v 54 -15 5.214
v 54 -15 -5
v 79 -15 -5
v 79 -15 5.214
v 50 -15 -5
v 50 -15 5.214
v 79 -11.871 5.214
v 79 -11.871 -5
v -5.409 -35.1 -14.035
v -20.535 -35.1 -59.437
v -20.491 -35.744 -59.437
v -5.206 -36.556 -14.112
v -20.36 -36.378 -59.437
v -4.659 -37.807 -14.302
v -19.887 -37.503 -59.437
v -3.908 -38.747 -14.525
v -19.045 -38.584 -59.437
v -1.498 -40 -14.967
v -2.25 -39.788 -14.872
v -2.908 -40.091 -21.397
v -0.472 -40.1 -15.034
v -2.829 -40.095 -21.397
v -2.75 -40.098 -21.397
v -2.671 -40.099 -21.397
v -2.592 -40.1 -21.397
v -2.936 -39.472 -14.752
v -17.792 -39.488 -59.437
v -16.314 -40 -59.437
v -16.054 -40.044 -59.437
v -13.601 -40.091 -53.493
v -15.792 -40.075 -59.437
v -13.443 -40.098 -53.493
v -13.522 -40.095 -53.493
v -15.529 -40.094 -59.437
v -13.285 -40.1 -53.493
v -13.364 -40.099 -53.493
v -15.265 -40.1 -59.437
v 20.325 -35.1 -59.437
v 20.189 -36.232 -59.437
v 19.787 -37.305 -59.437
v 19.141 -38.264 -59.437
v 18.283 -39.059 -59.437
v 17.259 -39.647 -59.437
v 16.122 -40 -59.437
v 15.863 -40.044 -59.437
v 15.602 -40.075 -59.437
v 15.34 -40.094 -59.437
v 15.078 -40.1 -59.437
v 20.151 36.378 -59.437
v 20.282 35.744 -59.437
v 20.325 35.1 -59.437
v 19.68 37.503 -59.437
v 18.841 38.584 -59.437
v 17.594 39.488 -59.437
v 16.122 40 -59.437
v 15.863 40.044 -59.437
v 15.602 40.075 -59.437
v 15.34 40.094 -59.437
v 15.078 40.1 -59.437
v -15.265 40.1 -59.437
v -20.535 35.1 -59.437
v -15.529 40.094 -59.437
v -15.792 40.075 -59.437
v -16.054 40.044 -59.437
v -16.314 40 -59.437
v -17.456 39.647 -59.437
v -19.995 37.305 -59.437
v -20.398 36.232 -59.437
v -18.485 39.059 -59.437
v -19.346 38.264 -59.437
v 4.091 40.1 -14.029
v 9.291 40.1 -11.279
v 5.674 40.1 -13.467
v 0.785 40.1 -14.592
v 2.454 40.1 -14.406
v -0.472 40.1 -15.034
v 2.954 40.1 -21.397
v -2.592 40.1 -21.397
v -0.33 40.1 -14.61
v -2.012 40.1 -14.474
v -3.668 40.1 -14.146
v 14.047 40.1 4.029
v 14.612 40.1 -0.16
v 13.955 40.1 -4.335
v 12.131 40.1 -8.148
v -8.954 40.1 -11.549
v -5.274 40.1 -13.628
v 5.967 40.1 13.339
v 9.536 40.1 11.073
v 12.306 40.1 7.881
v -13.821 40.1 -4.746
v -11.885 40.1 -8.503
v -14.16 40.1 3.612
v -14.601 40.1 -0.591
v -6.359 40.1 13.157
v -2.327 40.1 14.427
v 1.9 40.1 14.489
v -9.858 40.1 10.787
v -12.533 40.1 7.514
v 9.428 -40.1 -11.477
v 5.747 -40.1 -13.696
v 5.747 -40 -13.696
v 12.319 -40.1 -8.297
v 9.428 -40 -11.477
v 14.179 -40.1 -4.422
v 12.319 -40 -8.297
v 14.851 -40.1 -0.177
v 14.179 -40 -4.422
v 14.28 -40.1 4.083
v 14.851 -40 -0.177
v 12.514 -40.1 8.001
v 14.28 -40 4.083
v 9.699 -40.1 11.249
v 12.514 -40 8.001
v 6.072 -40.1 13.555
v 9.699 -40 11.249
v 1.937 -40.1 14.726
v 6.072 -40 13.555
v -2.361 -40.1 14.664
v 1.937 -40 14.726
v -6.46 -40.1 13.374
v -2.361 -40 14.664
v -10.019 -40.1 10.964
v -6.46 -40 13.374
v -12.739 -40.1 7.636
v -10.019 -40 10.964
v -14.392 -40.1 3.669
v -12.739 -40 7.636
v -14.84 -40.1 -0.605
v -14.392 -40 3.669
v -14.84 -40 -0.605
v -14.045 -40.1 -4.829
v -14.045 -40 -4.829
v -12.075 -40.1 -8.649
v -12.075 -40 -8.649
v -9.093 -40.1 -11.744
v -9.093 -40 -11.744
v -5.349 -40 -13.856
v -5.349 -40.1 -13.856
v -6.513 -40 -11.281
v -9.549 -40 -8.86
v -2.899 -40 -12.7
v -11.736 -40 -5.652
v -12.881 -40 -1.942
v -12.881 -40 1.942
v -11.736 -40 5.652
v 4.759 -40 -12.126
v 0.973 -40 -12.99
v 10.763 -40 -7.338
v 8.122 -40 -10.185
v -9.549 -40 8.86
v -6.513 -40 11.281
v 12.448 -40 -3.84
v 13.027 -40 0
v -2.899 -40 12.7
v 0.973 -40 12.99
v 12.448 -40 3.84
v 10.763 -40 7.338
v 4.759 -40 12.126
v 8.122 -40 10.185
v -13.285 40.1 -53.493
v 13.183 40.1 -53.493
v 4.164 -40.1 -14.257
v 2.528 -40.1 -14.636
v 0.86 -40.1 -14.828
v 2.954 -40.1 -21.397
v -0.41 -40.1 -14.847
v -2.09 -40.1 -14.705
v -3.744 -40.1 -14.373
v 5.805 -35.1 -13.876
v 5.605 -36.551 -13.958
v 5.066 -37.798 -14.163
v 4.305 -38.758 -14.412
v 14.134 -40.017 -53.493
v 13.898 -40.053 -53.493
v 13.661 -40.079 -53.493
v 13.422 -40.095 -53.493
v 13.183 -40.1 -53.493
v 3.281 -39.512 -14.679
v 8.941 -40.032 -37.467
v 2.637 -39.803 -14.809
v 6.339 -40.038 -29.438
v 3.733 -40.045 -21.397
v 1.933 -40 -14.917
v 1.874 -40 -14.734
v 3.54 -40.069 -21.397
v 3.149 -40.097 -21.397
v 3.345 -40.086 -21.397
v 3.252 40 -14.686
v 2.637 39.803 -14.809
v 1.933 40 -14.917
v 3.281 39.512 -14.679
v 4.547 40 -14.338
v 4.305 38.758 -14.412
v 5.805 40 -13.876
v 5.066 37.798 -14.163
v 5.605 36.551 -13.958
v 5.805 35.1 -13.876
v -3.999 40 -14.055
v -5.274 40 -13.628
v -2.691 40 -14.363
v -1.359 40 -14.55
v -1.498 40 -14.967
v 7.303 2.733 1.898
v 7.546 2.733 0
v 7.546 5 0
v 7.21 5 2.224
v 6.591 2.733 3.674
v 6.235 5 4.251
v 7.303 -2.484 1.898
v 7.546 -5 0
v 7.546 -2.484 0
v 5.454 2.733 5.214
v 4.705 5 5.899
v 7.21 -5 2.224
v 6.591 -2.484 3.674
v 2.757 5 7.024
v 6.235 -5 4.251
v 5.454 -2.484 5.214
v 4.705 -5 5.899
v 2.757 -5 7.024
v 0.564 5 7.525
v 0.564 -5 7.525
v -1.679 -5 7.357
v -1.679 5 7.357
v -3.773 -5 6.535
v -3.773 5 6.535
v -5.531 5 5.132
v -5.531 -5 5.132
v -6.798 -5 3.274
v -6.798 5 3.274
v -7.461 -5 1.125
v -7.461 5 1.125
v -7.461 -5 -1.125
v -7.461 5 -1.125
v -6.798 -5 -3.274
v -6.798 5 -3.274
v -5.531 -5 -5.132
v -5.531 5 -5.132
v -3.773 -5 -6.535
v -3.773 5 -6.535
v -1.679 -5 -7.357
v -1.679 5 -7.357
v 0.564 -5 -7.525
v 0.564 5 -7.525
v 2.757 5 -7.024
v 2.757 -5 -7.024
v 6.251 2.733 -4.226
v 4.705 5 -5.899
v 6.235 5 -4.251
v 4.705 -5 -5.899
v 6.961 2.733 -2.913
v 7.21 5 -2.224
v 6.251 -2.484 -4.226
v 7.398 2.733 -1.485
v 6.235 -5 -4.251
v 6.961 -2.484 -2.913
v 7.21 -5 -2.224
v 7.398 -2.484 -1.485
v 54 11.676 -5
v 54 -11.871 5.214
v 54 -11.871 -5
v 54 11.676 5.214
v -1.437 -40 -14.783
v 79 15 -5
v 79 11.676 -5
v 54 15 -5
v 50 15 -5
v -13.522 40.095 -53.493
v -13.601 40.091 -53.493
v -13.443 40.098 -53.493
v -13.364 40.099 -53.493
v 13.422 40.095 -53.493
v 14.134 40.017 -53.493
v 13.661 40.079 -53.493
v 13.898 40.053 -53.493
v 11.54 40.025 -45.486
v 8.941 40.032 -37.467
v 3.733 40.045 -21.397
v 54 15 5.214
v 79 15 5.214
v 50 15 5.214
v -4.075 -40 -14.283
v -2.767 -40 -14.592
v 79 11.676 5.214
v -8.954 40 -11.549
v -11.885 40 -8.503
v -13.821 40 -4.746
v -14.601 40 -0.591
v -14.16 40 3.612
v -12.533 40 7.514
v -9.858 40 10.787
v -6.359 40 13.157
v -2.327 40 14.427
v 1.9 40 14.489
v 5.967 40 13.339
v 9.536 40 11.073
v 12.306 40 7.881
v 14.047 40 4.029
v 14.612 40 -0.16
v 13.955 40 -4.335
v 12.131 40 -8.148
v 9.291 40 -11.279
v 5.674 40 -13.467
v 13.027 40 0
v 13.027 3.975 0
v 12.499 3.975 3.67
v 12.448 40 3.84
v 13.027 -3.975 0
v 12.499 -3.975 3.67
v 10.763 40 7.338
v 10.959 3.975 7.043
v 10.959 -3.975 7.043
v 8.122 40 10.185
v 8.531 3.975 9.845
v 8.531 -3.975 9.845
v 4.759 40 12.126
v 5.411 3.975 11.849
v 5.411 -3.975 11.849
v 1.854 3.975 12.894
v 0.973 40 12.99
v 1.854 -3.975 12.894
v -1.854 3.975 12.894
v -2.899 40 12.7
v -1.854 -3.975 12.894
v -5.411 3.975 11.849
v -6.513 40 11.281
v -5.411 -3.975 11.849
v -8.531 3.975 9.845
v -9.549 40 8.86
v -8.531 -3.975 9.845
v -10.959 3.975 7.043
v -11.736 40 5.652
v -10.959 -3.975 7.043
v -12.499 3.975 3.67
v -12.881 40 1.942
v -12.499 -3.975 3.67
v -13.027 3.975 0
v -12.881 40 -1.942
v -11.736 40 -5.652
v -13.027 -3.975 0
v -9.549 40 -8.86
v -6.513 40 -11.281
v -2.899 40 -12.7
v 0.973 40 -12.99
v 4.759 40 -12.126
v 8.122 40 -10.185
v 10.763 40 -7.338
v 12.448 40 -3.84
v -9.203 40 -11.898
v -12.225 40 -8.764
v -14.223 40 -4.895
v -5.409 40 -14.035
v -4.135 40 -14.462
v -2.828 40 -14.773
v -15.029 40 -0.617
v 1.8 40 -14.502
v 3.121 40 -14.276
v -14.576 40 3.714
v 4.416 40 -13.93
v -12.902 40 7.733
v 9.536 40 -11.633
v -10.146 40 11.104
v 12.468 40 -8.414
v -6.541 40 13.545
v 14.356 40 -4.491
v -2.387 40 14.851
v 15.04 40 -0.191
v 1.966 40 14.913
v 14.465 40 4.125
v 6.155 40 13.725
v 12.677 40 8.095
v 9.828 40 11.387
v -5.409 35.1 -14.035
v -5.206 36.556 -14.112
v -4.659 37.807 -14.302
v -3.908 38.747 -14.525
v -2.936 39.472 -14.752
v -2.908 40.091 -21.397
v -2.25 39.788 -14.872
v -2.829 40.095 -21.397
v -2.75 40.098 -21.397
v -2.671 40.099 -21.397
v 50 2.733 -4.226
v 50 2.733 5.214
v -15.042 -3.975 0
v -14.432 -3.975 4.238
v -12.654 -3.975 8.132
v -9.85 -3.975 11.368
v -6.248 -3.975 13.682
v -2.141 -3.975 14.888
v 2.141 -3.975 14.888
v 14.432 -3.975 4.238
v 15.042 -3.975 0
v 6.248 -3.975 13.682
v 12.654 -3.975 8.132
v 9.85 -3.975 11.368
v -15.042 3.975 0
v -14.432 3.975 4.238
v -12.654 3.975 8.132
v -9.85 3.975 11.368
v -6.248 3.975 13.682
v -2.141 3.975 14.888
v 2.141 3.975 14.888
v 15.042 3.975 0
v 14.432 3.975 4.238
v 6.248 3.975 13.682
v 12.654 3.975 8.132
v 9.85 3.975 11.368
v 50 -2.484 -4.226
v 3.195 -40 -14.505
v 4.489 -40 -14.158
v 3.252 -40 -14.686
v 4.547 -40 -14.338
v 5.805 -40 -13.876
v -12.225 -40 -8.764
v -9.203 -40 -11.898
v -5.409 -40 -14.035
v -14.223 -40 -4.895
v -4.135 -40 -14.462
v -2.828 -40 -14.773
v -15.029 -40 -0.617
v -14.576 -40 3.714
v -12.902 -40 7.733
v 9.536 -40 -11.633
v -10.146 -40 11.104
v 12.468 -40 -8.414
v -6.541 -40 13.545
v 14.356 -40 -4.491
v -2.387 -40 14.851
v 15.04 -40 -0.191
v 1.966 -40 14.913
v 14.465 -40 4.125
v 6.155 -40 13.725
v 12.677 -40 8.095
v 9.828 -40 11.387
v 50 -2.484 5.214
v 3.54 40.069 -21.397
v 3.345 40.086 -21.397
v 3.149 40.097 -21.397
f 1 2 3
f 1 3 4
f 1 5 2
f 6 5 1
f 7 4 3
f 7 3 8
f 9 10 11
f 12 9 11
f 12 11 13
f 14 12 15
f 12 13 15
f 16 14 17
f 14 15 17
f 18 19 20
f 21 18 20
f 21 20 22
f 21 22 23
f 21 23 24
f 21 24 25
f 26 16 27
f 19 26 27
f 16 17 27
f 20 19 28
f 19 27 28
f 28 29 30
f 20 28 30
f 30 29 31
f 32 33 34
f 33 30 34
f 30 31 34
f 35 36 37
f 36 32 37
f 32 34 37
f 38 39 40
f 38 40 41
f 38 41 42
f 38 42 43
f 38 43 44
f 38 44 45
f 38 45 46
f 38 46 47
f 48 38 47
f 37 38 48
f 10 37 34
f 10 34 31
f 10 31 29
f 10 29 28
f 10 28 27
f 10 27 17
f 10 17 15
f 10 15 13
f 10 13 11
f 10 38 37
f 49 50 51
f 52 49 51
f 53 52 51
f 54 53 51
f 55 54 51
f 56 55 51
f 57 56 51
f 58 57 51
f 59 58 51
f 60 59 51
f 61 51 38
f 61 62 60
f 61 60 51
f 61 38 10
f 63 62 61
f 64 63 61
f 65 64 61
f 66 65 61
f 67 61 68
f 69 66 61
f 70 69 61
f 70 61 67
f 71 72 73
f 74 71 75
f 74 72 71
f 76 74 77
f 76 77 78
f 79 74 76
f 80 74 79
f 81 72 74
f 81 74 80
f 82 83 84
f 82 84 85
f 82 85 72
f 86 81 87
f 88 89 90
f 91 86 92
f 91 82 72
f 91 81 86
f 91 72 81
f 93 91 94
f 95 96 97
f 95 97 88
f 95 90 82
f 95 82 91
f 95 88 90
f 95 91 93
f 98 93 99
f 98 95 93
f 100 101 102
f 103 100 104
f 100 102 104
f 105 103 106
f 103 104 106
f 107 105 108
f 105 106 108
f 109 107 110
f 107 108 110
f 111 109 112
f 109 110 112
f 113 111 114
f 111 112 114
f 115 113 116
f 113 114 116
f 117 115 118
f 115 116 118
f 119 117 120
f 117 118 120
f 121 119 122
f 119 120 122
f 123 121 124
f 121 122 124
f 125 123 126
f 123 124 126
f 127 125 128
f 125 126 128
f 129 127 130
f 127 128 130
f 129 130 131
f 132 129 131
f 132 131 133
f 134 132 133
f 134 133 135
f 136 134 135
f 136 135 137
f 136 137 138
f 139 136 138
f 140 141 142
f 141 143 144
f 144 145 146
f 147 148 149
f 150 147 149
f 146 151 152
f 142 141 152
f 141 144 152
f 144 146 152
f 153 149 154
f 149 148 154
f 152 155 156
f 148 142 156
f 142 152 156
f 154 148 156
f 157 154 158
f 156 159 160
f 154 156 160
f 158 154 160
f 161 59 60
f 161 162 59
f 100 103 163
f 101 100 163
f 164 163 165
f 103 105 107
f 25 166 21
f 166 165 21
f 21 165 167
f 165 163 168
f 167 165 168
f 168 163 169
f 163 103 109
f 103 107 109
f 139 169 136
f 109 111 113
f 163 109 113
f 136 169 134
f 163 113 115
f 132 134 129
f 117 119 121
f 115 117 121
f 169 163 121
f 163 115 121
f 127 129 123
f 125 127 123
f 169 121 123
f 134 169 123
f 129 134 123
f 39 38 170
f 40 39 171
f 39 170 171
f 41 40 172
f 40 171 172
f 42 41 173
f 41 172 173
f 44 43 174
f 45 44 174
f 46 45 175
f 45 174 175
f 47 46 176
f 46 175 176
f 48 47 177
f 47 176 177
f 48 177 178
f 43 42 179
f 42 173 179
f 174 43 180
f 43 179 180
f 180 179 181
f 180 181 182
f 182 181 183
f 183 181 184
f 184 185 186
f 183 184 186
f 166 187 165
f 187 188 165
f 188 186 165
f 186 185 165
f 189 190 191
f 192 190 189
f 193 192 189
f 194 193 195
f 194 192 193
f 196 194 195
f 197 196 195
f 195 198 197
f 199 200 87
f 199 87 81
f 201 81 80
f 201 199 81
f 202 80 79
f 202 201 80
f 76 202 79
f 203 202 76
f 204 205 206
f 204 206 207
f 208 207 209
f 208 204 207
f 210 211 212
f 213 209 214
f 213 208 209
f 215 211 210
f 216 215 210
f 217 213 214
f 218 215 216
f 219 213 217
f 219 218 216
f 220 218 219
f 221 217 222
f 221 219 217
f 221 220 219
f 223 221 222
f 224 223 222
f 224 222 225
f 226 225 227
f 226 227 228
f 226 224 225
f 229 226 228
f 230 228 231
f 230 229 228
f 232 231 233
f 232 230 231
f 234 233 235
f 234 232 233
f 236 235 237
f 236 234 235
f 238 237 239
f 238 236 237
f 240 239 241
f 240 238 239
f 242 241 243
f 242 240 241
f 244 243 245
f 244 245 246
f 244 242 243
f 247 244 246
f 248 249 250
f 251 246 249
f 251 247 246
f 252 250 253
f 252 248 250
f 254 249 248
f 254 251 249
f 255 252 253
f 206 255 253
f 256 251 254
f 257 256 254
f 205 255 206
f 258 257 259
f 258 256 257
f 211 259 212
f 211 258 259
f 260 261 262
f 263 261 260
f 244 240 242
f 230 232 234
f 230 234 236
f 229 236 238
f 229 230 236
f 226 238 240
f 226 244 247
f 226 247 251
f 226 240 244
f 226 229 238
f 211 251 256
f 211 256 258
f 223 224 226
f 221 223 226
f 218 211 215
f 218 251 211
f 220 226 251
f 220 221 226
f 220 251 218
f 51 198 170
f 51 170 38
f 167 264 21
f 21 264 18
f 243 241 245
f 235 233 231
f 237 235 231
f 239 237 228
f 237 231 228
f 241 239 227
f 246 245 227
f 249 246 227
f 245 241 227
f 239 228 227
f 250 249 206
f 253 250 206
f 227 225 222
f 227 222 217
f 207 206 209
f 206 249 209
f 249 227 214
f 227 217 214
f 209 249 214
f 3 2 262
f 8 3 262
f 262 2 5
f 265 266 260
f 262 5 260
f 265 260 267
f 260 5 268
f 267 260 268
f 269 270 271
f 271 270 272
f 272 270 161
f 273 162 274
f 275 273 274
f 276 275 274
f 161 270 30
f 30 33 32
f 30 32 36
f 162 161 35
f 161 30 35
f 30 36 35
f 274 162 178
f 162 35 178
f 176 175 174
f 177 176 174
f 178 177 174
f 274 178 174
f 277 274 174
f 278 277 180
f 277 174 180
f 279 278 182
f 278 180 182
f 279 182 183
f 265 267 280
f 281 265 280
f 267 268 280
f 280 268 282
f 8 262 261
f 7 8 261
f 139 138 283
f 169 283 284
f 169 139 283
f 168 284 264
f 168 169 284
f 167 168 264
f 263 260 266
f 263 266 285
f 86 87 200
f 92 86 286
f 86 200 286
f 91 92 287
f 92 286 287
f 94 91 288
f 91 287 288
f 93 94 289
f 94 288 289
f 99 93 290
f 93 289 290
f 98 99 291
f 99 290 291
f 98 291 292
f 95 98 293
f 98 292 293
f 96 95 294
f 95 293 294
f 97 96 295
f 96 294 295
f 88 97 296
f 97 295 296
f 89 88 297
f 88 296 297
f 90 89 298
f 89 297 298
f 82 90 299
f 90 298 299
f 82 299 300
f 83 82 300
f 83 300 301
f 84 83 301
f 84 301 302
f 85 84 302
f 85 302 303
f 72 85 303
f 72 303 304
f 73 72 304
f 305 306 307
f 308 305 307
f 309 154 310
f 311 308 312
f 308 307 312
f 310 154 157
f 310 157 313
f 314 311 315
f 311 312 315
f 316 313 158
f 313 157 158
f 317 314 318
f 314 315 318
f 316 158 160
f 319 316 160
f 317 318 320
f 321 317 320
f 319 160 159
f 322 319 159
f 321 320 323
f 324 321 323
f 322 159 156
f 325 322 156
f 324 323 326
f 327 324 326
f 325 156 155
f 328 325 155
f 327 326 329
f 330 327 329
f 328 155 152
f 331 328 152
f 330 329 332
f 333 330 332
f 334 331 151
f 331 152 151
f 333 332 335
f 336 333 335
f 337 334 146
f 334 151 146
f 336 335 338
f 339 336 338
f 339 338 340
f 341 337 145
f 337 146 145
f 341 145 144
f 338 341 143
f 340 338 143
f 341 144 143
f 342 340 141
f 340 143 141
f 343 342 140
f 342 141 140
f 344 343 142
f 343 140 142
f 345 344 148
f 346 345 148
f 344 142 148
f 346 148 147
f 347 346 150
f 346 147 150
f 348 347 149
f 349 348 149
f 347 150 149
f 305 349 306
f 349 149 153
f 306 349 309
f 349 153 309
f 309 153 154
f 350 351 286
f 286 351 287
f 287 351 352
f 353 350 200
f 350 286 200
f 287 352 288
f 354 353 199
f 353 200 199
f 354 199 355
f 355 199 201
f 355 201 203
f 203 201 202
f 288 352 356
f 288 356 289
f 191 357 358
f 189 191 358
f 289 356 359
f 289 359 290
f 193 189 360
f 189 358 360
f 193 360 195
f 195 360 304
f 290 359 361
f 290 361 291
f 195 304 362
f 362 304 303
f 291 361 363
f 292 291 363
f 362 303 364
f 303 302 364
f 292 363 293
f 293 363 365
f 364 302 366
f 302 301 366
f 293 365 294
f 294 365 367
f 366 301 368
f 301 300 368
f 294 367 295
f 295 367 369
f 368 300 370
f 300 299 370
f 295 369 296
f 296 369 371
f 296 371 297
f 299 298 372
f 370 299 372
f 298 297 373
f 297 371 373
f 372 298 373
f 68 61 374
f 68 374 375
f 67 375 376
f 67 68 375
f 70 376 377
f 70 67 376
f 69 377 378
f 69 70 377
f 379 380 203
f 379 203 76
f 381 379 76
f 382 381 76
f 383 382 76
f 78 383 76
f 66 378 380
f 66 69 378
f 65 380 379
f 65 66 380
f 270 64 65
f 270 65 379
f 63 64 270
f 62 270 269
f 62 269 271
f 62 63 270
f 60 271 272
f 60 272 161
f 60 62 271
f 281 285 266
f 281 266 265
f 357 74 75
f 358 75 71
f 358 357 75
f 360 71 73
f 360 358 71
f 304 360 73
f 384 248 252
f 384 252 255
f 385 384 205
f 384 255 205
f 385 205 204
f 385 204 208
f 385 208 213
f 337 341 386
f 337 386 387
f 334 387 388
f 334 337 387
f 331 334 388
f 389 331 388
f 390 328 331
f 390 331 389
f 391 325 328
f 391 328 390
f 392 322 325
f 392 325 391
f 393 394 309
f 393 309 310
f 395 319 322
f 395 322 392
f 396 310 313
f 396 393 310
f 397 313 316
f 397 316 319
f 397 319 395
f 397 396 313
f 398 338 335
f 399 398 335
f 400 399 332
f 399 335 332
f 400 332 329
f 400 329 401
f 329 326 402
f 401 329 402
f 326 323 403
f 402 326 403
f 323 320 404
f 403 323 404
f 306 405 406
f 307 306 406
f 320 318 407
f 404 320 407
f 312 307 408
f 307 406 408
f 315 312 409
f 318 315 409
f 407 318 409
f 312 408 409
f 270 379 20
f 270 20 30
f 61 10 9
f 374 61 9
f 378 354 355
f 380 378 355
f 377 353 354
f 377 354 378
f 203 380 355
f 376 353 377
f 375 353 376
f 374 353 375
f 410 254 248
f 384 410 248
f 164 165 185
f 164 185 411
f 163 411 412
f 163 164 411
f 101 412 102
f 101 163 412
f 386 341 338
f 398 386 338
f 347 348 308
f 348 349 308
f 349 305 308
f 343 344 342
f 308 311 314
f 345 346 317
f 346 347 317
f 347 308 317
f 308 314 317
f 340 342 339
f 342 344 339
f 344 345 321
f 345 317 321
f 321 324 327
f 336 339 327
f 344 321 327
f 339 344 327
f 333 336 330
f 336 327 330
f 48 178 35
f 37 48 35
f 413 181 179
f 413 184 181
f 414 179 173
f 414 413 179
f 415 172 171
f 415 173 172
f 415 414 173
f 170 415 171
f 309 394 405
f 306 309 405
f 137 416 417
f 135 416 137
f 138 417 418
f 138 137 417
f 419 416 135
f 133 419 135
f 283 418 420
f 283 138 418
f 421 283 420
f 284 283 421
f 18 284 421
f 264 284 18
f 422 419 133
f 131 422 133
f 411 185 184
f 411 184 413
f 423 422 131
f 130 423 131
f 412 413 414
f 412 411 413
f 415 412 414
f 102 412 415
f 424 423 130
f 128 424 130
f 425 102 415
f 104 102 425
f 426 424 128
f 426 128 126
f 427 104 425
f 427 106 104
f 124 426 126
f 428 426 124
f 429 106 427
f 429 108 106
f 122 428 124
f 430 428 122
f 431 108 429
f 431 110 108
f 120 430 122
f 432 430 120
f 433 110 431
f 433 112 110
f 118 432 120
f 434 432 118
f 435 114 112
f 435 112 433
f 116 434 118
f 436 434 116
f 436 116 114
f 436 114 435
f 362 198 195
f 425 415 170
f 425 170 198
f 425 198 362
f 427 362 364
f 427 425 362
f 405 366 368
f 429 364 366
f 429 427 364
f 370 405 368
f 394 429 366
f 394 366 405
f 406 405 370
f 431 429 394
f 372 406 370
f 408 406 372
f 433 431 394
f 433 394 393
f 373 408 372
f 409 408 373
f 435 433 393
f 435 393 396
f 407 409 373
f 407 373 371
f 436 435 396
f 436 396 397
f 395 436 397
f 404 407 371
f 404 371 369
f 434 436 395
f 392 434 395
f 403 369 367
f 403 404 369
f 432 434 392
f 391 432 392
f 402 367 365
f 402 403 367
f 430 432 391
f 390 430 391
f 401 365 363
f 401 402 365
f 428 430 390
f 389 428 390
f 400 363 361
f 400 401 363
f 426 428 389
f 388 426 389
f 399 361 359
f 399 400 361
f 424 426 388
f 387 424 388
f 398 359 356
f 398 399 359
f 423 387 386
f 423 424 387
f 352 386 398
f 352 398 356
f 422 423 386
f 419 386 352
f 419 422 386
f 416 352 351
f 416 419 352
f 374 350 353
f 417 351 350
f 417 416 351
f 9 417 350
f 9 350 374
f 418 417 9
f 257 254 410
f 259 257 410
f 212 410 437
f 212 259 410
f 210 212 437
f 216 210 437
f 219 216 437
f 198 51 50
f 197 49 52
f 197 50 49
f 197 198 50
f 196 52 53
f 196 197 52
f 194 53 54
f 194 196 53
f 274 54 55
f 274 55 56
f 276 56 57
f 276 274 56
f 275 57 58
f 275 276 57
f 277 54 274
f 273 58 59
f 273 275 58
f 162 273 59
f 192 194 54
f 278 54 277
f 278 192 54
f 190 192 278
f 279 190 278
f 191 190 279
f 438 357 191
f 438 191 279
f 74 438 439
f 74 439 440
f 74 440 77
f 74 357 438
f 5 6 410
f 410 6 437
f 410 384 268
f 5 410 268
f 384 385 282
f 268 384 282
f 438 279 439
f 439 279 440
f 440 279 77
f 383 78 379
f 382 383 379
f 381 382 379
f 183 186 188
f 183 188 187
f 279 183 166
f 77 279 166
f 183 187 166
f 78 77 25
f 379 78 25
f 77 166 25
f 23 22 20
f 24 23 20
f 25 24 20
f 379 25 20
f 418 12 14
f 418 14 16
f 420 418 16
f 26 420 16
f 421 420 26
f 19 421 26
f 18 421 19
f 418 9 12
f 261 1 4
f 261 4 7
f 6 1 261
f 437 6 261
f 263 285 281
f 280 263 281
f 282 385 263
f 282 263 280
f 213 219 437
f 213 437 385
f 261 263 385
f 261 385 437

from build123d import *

# Parameters (mm, degrees)
F0_R          = 15.0415455236
F1_DEPTH      = 40
F2_R          = 13.0265097032
F3_DEPTH      = 80
F4_W          = 7.9495264217
F4_H          = 15.6480446458
F5_DEPTH      = 17.5
F6_R          = 7.5456912494
F7_DEPTH      = 5
F8_W          = 5.216877209
F8_H          = 9.4400634989
F9_DEPTH      = 50
F10_W         = 30
F10_H         = 10.2142902277
F11_DEPTH     = 4
F12_W         = 3.1286751479
F12_H         = 10.2142902277
F13_DEPTH     = 25
F14_W         = 3.3241308853
F14_H         = 10.2142902277
F15_DEPTH     = 25
F16_R         = 14.8524902499
F17_DEPTH     = 0.1
F18_R         = 14.6132587067
F19_DEPTH     = 0.1
F21_DEPTH     = 80.2
F23_DEPTH     = 80.201
F24_T4_DEPTH  = 73.2481904339
F24_S5_R      = 14.6132587067
F24_T6_DEPTH  = 40
F24_T11_DEPTH = 73.2481904339
F24_S12_R     = 15.0415455236
F24_T13_DEPTH = 40
F24_T17_DEPTH = 73.2835146544
F24_S18_R     = 15.0415455236
F24_T19_DEPTH = 40
F24_T23_DEPTH = 73.2835146544
F24_S24_R     = 14.6132587067
F24_T25_DEPTH = 40
F24_T30_DEPTH = 73.0440159481
F24_S31_R     = 15.0415455236
F24_T32_DEPTH = 40
F24_T36_DEPTH = 73.0440159481
F24_S37_R     = 14.8524902499
F24_T38_DEPTH = 40
F24_T43_DEPTH = 73.0079978677
F24_S44_R     = 14.8524902499
F24_T45_DEPTH = 40
F24_T50_DEPTH = 73.0079978677
F24_S51_R     = 15.0415455236
F24_T52_DEPTH = 40


# Not quite as in the source:
# - a fillet or chamfer that OpenCascade refuses, or shapes differently, is made with other operations: its cross-section is extruded or revolved along the edge and cut away or added


with BuildPart() as f1:
    # F0 (on Front) → F1 (new body, symmetric)
    with BuildSketch(Plane.XZ):
        Circle(F0_R)
    extrude(amount=F1_DEPTH, both=True)

    # F2 (on face) → F3 (cut)
    with BuildSketch(Plane.XZ.offset(40)):
        Circle(F2_R)
    extrude(amount=-F3_DEPTH, mode=Mode.SUBTRACT)

    # F4 (on Right) → F5 (cut, symmetric)
    with BuildSketch(Plane.YZ):
        with Locations((0, 7.8240223229)):
            Rectangle(F4_W, F4_H)
    extrude(amount=F5_DEPTH, both=True, mode=Mode.SUBTRACT)

    # F16 (on face) → F17 (join)
    with BuildSketch(Plane.XZ.offset(40)):
        Circle(F16_R)
    extrude(amount=F17_DEPTH)

    # F18 (on face) → F19 (join)
    with BuildSketch(Plane(origin=(0, 40, 0), x_dir=(-1, 0, 0), z_dir=(0, 1, 0))):
        Circle(F18_R)
    extrude(amount=F19_DEPTH)

    # F20 (on face) → F21 (join)
    with BuildSketch(Plane(origin=(0, 40.1, 0), x_dir=(-1, 0, 0), z_dir=(0, 1, 0))):
        Polygon((5.2737725107, -13.6284501516), (-5.6739483665, -13.4667605594), (-20.3254725784, -59.4365410507), (20.5353777856, -59.4365410507), align=None)
    extrude(amount=-F21_DEPTH)

    # F22 (on face) → F23 (cut, through all)
    with BuildSketch(Plane.XZ.offset(40.1)):
        Polygon((-2.9082546706, -21.3973574286), (-13.6014148593, -53.4931458533), (14.1344349831, -53.4931458533), (3.7334910594, -21.3973574286), align=None)
    extrude(amount=-F23_DEPTH, mode=Mode.SUBTRACT)

    # F24: fillet of radius 5 on 4 edges, made by hand


with BuildPart() as f7:
    # F6 (on Front) → F7 (new body, symmetric)
    with BuildSketch(Plane.XZ):
        Circle(F6_R)
    extrude(amount=F7_DEPTH, both=True)

    # F8 (on Right) → F9 (join)
    with BuildSketch(Plane.YZ):
        with Locations((0.1242113067, 0.4942584783)):
            Rectangle(F8_W, F8_H)
    extrude(amount=F9_DEPTH)

    # F10 (on face) → F11 (join)
    with BuildSketch(Plane.YZ.offset(50)):
        with Locations((0, 0.1071451139)):
            Rectangle(F10_W, F10_H)
    extrude(amount=F11_DEPTH)

    # F12 (on face) → F13 (join)
    with BuildSketch(Plane.YZ.offset(54)):
        with Locations((-13.4356624261, 0.1071451139)):
            Rectangle(F12_W, F12_H)
    extrude(amount=F13_DEPTH)

    # F14 (on face) → F15 (join)
    with BuildSketch(Plane.YZ.offset(54)):
        with Locations((13.3379345573, 0.1071451139)):
            Rectangle(F14_W, F14_H)
    extrude(amount=F15_DEPTH)


with BuildPart() as f24_tool2:
    # F24_s3 → F24_t4 (new body)
    with BuildSketch(Plane(origin=(0.6236867561, 0, -1.9568437291), x_dir=(0, 1, 0), z_dir=(0.3036699217, 0, -0.9527772975))):
        with BuildLine():
            ThreePointArc((35.1, 1.3165590661), (38.6355339059, -0.147907028), (40.1, -3.6834409339))
            Line((40.1, -3.6834409339), (40.1, 1.3165590661))
            Line((40.1, 1.3165590661), (35.1, 1.3165590661))
        make_face()
    extrude(amount=F24_T4_DEPTH)

    # F24_s5 → F24_t6 (cut, symmetric)
    with BuildSketch(Plane.XZ.offset(-37.6)):
        Circle(F24_S5_R)
    extrude(amount=F24_T6_DEPTH, both=True, mode=Mode.SUBTRACT)

    split(bisect_by=Plane.XZ.offset(-40), keep=Keep.BOTTOM)


with BuildPart() as f1_1:
    add(f1.part)

    # F24_t1: cut F24_tool2
    add(f24_tool2.part, mode=Mode.SUBTRACT)


with BuildPart() as f24_tool9:
    # F24_s10 → F24_t11 (new body)
    with BuildSketch(Plane(origin=(0.6236867561, 0, -1.9568437291), x_dir=(0, 1, 0), z_dir=(0.3036699217, 0, -0.9527772975))):
        with BuildLine():
            ThreePointArc((35.1, 1.3165590661), (38.6355339059, -0.147907028), (40.1, -3.6834409339))
            Line((40.1, -3.6834409339), (40.1, 1.3165590661))
            Line((40.1, 1.3165590661), (35.1, 1.3165590661))
        make_face()
    extrude(amount=F24_T11_DEPTH)

    # F24_s12 → F24_t13 (cut, symmetric)
    with BuildSketch(Plane.XZ.offset(-37.6)):
        Circle(F24_S12_R)
    extrude(amount=F24_T13_DEPTH, both=True, mode=Mode.SUBTRACT)


with BuildPart() as f1_2:
    add(f1_1.part)

    # F24_t8: cut F24_tool9
    add(f24_tool9.part, mode=Mode.SUBTRACT)


with BuildPart() as f24_tool15:
    # F24_s16 → F24_t17 (new body)
    with BuildSketch(Plane(origin=(-23.8264124769, 0, -71.5155744685), x_dir=(0, 1, 0), z_dir=(0.3160831473, 0, 0.948731492))):
        with BuildLine():
            ThreePointArc((35.1, 0.695670646), (38.6355339059, -0.7687954481), (40.1, -4.304329354))
            Line((40.1, -4.304329354), (40.1, 0.695670646))
            Line((40.1, 0.695670646), (35.1, 0.695670646))
        make_face()
    extrude(amount=F24_T17_DEPTH)

    # F24_s18 → F24_t19 (cut, symmetric)
    with BuildSketch(Plane.XZ.offset(-37.6)):
        Circle(F24_S18_R)
    extrude(amount=F24_T19_DEPTH, both=True, mode=Mode.SUBTRACT)


with BuildPart() as f1_3:
    add(f1_2.part)

    # F24_t14: cut F24_tool15
    add(f24_tool15.part, mode=Mode.SUBTRACT)


with BuildPart() as f24_tool21:
    # F24_s22 → F24_t23 (new body)
    with BuildSketch(Plane(origin=(-23.8264124769, 0, -71.5155744685), x_dir=(0, 1, 0), z_dir=(0.3160831473, 0, 0.948731492))):
        with BuildLine():
            ThreePointArc((35.1, 0.695670646), (38.6355339059, -0.7687954481), (40.1, -4.304329354))
            Line((40.1, -4.304329354), (40.1, 0.695670646))
            Line((40.1, 0.695670646), (35.1, 0.695670646))
        make_face()
    extrude(amount=F24_T23_DEPTH)

    # F24_s24 → F24_t25 (cut, symmetric)
    with BuildSketch(Plane.XZ.offset(-37.6)):
        Circle(F24_S24_R)
    extrude(amount=F24_T25_DEPTH, both=True, mode=Mode.SUBTRACT)

    split(bisect_by=Plane.XZ.offset(-40), keep=Keep.BOTTOM)


with BuildPart() as f1_4:
    add(f1_3.part)

    # F24_t20: cut F24_tool21
    add(f24_tool21.part, mode=Mode.SUBTRACT)


with BuildPart() as f24_tool28:
    # F24_s29 → F24_t30 (new body)
    with BuildSketch(Plane(origin=(-23.8264124769, 0, -71.5155744685), x_dir=(0, 1, 0), z_dir=(0.3160831473, 0, 0.948731492))):
        with BuildLine():
            ThreePointArc((-35.1, 0.695670646), (-38.6355339059, -0.7687954481), (-40.1, -4.304329354))
            Line((-40.1, -4.304329354), (-40.1, 0.695670646))
            Line((-40.1, 0.695670646), (-35.1, 0.695670646))
        make_face()
    extrude(amount=F24_T30_DEPTH)

    # F24_s31 → F24_t32 (cut, symmetric)
    with BuildSketch(Plane.XZ.offset(37.6)):
        Circle(F24_S31_R)
    extrude(amount=F24_T32_DEPTH, both=True, mode=Mode.SUBTRACT)


with BuildPart() as f1_5:
    add(f1_4.part)

    # F24_t27: cut F24_tool28
    add(f24_tool28.part, mode=Mode.SUBTRACT)


with BuildPart() as f24_tool34:
    # F24_s35 → F24_t36 (new body)
    with BuildSketch(Plane(origin=(-23.8264124769, 0, -71.5155744685), x_dir=(0, 1, 0), z_dir=(0.3160831473, 0, 0.948731492))):
        with BuildLine():
            ThreePointArc((-35.1, 0.695670646), (-38.6355339059, -0.7687954481), (-40.1, -4.304329354))
            Line((-40.1, -4.304329354), (-40.1, 0.695670646))
            Line((-40.1, 0.695670646), (-35.1, 0.695670646))
        make_face()
    extrude(amount=F24_T36_DEPTH)

    # F24_s37 → F24_t38 (cut, symmetric)
    with BuildSketch(Plane.XZ.offset(37.6)):
        Circle(F24_S37_R)
    extrude(amount=F24_T38_DEPTH, both=True, mode=Mode.SUBTRACT)

    split(bisect_by=Plane.XZ.offset(40), keep=Keep.TOP)


with BuildPart() as f1_6:
    add(f1_5.part)

    # F24_t33: cut F24_tool34
    add(f24_tool34.part, mode=Mode.SUBTRACT)


with BuildPart() as f24_tool41:
    # F24_s42 → F24_t43 (new body)
    with BuildSketch(Plane(origin=(0.6966260139, 0, -2.1856937532), x_dir=(0, 1, 0), z_dir=(0.3036699217, 0, -0.9527772975))):
        with BuildLine():
            ThreePointArc((-35.1, 1.3165590661), (-38.6355339059, -0.147907028), (-40.1, -3.6834409339))
            Line((-40.1, -3.6834409339), (-40.1, 1.3165590661))
            Line((-40.1, 1.3165590661), (-35.1, 1.3165590661))
        make_face()
    extrude(amount=F24_T43_DEPTH)

    # F24_s44 → F24_t45 (cut, symmetric)
    with BuildSketch(Plane.XZ.offset(37.6)):
        Circle(F24_S44_R)
    extrude(amount=F24_T45_DEPTH, both=True, mode=Mode.SUBTRACT)

    split(bisect_by=Plane.XZ.offset(40), keep=Keep.TOP)


with BuildPart() as f1_7:
    add(f1_6.part)

    # F24_t40: cut F24_tool41
    add(f24_tool41.part, mode=Mode.SUBTRACT)


with BuildPart() as f24_tool48:
    # F24_s49 → F24_t50 (new body)
    with BuildSketch(Plane(origin=(0.6966260139, 0, -2.1856937532), x_dir=(0, 1, 0), z_dir=(0.3036699217, 0, -0.9527772975))):
        with BuildLine():
            ThreePointArc((-35.1, 1.3165590661), (-38.6355339059, -0.147907028), (-40.1, -3.6834409339))
            Line((-40.1, -3.6834409339), (-40.1, 1.3165590661))
            Line((-40.1, 1.3165590661), (-35.1, 1.3165590661))
        make_face()
    extrude(amount=F24_T50_DEPTH)

    # F24_s51 → F24_t52 (cut, symmetric)
    with BuildSketch(Plane.XZ.offset(37.6)):
        Circle(F24_S51_R)
    extrude(amount=F24_T52_DEPTH, both=True, mode=Mode.SUBTRACT)


with BuildPart() as f1_8:
    add(f1_7.part)

    # F24_t47: cut F24_tool48
    add(f24_tool48.part, mode=Mode.SUBTRACT)


solid = Compound([f7.part, f1_8.part])
